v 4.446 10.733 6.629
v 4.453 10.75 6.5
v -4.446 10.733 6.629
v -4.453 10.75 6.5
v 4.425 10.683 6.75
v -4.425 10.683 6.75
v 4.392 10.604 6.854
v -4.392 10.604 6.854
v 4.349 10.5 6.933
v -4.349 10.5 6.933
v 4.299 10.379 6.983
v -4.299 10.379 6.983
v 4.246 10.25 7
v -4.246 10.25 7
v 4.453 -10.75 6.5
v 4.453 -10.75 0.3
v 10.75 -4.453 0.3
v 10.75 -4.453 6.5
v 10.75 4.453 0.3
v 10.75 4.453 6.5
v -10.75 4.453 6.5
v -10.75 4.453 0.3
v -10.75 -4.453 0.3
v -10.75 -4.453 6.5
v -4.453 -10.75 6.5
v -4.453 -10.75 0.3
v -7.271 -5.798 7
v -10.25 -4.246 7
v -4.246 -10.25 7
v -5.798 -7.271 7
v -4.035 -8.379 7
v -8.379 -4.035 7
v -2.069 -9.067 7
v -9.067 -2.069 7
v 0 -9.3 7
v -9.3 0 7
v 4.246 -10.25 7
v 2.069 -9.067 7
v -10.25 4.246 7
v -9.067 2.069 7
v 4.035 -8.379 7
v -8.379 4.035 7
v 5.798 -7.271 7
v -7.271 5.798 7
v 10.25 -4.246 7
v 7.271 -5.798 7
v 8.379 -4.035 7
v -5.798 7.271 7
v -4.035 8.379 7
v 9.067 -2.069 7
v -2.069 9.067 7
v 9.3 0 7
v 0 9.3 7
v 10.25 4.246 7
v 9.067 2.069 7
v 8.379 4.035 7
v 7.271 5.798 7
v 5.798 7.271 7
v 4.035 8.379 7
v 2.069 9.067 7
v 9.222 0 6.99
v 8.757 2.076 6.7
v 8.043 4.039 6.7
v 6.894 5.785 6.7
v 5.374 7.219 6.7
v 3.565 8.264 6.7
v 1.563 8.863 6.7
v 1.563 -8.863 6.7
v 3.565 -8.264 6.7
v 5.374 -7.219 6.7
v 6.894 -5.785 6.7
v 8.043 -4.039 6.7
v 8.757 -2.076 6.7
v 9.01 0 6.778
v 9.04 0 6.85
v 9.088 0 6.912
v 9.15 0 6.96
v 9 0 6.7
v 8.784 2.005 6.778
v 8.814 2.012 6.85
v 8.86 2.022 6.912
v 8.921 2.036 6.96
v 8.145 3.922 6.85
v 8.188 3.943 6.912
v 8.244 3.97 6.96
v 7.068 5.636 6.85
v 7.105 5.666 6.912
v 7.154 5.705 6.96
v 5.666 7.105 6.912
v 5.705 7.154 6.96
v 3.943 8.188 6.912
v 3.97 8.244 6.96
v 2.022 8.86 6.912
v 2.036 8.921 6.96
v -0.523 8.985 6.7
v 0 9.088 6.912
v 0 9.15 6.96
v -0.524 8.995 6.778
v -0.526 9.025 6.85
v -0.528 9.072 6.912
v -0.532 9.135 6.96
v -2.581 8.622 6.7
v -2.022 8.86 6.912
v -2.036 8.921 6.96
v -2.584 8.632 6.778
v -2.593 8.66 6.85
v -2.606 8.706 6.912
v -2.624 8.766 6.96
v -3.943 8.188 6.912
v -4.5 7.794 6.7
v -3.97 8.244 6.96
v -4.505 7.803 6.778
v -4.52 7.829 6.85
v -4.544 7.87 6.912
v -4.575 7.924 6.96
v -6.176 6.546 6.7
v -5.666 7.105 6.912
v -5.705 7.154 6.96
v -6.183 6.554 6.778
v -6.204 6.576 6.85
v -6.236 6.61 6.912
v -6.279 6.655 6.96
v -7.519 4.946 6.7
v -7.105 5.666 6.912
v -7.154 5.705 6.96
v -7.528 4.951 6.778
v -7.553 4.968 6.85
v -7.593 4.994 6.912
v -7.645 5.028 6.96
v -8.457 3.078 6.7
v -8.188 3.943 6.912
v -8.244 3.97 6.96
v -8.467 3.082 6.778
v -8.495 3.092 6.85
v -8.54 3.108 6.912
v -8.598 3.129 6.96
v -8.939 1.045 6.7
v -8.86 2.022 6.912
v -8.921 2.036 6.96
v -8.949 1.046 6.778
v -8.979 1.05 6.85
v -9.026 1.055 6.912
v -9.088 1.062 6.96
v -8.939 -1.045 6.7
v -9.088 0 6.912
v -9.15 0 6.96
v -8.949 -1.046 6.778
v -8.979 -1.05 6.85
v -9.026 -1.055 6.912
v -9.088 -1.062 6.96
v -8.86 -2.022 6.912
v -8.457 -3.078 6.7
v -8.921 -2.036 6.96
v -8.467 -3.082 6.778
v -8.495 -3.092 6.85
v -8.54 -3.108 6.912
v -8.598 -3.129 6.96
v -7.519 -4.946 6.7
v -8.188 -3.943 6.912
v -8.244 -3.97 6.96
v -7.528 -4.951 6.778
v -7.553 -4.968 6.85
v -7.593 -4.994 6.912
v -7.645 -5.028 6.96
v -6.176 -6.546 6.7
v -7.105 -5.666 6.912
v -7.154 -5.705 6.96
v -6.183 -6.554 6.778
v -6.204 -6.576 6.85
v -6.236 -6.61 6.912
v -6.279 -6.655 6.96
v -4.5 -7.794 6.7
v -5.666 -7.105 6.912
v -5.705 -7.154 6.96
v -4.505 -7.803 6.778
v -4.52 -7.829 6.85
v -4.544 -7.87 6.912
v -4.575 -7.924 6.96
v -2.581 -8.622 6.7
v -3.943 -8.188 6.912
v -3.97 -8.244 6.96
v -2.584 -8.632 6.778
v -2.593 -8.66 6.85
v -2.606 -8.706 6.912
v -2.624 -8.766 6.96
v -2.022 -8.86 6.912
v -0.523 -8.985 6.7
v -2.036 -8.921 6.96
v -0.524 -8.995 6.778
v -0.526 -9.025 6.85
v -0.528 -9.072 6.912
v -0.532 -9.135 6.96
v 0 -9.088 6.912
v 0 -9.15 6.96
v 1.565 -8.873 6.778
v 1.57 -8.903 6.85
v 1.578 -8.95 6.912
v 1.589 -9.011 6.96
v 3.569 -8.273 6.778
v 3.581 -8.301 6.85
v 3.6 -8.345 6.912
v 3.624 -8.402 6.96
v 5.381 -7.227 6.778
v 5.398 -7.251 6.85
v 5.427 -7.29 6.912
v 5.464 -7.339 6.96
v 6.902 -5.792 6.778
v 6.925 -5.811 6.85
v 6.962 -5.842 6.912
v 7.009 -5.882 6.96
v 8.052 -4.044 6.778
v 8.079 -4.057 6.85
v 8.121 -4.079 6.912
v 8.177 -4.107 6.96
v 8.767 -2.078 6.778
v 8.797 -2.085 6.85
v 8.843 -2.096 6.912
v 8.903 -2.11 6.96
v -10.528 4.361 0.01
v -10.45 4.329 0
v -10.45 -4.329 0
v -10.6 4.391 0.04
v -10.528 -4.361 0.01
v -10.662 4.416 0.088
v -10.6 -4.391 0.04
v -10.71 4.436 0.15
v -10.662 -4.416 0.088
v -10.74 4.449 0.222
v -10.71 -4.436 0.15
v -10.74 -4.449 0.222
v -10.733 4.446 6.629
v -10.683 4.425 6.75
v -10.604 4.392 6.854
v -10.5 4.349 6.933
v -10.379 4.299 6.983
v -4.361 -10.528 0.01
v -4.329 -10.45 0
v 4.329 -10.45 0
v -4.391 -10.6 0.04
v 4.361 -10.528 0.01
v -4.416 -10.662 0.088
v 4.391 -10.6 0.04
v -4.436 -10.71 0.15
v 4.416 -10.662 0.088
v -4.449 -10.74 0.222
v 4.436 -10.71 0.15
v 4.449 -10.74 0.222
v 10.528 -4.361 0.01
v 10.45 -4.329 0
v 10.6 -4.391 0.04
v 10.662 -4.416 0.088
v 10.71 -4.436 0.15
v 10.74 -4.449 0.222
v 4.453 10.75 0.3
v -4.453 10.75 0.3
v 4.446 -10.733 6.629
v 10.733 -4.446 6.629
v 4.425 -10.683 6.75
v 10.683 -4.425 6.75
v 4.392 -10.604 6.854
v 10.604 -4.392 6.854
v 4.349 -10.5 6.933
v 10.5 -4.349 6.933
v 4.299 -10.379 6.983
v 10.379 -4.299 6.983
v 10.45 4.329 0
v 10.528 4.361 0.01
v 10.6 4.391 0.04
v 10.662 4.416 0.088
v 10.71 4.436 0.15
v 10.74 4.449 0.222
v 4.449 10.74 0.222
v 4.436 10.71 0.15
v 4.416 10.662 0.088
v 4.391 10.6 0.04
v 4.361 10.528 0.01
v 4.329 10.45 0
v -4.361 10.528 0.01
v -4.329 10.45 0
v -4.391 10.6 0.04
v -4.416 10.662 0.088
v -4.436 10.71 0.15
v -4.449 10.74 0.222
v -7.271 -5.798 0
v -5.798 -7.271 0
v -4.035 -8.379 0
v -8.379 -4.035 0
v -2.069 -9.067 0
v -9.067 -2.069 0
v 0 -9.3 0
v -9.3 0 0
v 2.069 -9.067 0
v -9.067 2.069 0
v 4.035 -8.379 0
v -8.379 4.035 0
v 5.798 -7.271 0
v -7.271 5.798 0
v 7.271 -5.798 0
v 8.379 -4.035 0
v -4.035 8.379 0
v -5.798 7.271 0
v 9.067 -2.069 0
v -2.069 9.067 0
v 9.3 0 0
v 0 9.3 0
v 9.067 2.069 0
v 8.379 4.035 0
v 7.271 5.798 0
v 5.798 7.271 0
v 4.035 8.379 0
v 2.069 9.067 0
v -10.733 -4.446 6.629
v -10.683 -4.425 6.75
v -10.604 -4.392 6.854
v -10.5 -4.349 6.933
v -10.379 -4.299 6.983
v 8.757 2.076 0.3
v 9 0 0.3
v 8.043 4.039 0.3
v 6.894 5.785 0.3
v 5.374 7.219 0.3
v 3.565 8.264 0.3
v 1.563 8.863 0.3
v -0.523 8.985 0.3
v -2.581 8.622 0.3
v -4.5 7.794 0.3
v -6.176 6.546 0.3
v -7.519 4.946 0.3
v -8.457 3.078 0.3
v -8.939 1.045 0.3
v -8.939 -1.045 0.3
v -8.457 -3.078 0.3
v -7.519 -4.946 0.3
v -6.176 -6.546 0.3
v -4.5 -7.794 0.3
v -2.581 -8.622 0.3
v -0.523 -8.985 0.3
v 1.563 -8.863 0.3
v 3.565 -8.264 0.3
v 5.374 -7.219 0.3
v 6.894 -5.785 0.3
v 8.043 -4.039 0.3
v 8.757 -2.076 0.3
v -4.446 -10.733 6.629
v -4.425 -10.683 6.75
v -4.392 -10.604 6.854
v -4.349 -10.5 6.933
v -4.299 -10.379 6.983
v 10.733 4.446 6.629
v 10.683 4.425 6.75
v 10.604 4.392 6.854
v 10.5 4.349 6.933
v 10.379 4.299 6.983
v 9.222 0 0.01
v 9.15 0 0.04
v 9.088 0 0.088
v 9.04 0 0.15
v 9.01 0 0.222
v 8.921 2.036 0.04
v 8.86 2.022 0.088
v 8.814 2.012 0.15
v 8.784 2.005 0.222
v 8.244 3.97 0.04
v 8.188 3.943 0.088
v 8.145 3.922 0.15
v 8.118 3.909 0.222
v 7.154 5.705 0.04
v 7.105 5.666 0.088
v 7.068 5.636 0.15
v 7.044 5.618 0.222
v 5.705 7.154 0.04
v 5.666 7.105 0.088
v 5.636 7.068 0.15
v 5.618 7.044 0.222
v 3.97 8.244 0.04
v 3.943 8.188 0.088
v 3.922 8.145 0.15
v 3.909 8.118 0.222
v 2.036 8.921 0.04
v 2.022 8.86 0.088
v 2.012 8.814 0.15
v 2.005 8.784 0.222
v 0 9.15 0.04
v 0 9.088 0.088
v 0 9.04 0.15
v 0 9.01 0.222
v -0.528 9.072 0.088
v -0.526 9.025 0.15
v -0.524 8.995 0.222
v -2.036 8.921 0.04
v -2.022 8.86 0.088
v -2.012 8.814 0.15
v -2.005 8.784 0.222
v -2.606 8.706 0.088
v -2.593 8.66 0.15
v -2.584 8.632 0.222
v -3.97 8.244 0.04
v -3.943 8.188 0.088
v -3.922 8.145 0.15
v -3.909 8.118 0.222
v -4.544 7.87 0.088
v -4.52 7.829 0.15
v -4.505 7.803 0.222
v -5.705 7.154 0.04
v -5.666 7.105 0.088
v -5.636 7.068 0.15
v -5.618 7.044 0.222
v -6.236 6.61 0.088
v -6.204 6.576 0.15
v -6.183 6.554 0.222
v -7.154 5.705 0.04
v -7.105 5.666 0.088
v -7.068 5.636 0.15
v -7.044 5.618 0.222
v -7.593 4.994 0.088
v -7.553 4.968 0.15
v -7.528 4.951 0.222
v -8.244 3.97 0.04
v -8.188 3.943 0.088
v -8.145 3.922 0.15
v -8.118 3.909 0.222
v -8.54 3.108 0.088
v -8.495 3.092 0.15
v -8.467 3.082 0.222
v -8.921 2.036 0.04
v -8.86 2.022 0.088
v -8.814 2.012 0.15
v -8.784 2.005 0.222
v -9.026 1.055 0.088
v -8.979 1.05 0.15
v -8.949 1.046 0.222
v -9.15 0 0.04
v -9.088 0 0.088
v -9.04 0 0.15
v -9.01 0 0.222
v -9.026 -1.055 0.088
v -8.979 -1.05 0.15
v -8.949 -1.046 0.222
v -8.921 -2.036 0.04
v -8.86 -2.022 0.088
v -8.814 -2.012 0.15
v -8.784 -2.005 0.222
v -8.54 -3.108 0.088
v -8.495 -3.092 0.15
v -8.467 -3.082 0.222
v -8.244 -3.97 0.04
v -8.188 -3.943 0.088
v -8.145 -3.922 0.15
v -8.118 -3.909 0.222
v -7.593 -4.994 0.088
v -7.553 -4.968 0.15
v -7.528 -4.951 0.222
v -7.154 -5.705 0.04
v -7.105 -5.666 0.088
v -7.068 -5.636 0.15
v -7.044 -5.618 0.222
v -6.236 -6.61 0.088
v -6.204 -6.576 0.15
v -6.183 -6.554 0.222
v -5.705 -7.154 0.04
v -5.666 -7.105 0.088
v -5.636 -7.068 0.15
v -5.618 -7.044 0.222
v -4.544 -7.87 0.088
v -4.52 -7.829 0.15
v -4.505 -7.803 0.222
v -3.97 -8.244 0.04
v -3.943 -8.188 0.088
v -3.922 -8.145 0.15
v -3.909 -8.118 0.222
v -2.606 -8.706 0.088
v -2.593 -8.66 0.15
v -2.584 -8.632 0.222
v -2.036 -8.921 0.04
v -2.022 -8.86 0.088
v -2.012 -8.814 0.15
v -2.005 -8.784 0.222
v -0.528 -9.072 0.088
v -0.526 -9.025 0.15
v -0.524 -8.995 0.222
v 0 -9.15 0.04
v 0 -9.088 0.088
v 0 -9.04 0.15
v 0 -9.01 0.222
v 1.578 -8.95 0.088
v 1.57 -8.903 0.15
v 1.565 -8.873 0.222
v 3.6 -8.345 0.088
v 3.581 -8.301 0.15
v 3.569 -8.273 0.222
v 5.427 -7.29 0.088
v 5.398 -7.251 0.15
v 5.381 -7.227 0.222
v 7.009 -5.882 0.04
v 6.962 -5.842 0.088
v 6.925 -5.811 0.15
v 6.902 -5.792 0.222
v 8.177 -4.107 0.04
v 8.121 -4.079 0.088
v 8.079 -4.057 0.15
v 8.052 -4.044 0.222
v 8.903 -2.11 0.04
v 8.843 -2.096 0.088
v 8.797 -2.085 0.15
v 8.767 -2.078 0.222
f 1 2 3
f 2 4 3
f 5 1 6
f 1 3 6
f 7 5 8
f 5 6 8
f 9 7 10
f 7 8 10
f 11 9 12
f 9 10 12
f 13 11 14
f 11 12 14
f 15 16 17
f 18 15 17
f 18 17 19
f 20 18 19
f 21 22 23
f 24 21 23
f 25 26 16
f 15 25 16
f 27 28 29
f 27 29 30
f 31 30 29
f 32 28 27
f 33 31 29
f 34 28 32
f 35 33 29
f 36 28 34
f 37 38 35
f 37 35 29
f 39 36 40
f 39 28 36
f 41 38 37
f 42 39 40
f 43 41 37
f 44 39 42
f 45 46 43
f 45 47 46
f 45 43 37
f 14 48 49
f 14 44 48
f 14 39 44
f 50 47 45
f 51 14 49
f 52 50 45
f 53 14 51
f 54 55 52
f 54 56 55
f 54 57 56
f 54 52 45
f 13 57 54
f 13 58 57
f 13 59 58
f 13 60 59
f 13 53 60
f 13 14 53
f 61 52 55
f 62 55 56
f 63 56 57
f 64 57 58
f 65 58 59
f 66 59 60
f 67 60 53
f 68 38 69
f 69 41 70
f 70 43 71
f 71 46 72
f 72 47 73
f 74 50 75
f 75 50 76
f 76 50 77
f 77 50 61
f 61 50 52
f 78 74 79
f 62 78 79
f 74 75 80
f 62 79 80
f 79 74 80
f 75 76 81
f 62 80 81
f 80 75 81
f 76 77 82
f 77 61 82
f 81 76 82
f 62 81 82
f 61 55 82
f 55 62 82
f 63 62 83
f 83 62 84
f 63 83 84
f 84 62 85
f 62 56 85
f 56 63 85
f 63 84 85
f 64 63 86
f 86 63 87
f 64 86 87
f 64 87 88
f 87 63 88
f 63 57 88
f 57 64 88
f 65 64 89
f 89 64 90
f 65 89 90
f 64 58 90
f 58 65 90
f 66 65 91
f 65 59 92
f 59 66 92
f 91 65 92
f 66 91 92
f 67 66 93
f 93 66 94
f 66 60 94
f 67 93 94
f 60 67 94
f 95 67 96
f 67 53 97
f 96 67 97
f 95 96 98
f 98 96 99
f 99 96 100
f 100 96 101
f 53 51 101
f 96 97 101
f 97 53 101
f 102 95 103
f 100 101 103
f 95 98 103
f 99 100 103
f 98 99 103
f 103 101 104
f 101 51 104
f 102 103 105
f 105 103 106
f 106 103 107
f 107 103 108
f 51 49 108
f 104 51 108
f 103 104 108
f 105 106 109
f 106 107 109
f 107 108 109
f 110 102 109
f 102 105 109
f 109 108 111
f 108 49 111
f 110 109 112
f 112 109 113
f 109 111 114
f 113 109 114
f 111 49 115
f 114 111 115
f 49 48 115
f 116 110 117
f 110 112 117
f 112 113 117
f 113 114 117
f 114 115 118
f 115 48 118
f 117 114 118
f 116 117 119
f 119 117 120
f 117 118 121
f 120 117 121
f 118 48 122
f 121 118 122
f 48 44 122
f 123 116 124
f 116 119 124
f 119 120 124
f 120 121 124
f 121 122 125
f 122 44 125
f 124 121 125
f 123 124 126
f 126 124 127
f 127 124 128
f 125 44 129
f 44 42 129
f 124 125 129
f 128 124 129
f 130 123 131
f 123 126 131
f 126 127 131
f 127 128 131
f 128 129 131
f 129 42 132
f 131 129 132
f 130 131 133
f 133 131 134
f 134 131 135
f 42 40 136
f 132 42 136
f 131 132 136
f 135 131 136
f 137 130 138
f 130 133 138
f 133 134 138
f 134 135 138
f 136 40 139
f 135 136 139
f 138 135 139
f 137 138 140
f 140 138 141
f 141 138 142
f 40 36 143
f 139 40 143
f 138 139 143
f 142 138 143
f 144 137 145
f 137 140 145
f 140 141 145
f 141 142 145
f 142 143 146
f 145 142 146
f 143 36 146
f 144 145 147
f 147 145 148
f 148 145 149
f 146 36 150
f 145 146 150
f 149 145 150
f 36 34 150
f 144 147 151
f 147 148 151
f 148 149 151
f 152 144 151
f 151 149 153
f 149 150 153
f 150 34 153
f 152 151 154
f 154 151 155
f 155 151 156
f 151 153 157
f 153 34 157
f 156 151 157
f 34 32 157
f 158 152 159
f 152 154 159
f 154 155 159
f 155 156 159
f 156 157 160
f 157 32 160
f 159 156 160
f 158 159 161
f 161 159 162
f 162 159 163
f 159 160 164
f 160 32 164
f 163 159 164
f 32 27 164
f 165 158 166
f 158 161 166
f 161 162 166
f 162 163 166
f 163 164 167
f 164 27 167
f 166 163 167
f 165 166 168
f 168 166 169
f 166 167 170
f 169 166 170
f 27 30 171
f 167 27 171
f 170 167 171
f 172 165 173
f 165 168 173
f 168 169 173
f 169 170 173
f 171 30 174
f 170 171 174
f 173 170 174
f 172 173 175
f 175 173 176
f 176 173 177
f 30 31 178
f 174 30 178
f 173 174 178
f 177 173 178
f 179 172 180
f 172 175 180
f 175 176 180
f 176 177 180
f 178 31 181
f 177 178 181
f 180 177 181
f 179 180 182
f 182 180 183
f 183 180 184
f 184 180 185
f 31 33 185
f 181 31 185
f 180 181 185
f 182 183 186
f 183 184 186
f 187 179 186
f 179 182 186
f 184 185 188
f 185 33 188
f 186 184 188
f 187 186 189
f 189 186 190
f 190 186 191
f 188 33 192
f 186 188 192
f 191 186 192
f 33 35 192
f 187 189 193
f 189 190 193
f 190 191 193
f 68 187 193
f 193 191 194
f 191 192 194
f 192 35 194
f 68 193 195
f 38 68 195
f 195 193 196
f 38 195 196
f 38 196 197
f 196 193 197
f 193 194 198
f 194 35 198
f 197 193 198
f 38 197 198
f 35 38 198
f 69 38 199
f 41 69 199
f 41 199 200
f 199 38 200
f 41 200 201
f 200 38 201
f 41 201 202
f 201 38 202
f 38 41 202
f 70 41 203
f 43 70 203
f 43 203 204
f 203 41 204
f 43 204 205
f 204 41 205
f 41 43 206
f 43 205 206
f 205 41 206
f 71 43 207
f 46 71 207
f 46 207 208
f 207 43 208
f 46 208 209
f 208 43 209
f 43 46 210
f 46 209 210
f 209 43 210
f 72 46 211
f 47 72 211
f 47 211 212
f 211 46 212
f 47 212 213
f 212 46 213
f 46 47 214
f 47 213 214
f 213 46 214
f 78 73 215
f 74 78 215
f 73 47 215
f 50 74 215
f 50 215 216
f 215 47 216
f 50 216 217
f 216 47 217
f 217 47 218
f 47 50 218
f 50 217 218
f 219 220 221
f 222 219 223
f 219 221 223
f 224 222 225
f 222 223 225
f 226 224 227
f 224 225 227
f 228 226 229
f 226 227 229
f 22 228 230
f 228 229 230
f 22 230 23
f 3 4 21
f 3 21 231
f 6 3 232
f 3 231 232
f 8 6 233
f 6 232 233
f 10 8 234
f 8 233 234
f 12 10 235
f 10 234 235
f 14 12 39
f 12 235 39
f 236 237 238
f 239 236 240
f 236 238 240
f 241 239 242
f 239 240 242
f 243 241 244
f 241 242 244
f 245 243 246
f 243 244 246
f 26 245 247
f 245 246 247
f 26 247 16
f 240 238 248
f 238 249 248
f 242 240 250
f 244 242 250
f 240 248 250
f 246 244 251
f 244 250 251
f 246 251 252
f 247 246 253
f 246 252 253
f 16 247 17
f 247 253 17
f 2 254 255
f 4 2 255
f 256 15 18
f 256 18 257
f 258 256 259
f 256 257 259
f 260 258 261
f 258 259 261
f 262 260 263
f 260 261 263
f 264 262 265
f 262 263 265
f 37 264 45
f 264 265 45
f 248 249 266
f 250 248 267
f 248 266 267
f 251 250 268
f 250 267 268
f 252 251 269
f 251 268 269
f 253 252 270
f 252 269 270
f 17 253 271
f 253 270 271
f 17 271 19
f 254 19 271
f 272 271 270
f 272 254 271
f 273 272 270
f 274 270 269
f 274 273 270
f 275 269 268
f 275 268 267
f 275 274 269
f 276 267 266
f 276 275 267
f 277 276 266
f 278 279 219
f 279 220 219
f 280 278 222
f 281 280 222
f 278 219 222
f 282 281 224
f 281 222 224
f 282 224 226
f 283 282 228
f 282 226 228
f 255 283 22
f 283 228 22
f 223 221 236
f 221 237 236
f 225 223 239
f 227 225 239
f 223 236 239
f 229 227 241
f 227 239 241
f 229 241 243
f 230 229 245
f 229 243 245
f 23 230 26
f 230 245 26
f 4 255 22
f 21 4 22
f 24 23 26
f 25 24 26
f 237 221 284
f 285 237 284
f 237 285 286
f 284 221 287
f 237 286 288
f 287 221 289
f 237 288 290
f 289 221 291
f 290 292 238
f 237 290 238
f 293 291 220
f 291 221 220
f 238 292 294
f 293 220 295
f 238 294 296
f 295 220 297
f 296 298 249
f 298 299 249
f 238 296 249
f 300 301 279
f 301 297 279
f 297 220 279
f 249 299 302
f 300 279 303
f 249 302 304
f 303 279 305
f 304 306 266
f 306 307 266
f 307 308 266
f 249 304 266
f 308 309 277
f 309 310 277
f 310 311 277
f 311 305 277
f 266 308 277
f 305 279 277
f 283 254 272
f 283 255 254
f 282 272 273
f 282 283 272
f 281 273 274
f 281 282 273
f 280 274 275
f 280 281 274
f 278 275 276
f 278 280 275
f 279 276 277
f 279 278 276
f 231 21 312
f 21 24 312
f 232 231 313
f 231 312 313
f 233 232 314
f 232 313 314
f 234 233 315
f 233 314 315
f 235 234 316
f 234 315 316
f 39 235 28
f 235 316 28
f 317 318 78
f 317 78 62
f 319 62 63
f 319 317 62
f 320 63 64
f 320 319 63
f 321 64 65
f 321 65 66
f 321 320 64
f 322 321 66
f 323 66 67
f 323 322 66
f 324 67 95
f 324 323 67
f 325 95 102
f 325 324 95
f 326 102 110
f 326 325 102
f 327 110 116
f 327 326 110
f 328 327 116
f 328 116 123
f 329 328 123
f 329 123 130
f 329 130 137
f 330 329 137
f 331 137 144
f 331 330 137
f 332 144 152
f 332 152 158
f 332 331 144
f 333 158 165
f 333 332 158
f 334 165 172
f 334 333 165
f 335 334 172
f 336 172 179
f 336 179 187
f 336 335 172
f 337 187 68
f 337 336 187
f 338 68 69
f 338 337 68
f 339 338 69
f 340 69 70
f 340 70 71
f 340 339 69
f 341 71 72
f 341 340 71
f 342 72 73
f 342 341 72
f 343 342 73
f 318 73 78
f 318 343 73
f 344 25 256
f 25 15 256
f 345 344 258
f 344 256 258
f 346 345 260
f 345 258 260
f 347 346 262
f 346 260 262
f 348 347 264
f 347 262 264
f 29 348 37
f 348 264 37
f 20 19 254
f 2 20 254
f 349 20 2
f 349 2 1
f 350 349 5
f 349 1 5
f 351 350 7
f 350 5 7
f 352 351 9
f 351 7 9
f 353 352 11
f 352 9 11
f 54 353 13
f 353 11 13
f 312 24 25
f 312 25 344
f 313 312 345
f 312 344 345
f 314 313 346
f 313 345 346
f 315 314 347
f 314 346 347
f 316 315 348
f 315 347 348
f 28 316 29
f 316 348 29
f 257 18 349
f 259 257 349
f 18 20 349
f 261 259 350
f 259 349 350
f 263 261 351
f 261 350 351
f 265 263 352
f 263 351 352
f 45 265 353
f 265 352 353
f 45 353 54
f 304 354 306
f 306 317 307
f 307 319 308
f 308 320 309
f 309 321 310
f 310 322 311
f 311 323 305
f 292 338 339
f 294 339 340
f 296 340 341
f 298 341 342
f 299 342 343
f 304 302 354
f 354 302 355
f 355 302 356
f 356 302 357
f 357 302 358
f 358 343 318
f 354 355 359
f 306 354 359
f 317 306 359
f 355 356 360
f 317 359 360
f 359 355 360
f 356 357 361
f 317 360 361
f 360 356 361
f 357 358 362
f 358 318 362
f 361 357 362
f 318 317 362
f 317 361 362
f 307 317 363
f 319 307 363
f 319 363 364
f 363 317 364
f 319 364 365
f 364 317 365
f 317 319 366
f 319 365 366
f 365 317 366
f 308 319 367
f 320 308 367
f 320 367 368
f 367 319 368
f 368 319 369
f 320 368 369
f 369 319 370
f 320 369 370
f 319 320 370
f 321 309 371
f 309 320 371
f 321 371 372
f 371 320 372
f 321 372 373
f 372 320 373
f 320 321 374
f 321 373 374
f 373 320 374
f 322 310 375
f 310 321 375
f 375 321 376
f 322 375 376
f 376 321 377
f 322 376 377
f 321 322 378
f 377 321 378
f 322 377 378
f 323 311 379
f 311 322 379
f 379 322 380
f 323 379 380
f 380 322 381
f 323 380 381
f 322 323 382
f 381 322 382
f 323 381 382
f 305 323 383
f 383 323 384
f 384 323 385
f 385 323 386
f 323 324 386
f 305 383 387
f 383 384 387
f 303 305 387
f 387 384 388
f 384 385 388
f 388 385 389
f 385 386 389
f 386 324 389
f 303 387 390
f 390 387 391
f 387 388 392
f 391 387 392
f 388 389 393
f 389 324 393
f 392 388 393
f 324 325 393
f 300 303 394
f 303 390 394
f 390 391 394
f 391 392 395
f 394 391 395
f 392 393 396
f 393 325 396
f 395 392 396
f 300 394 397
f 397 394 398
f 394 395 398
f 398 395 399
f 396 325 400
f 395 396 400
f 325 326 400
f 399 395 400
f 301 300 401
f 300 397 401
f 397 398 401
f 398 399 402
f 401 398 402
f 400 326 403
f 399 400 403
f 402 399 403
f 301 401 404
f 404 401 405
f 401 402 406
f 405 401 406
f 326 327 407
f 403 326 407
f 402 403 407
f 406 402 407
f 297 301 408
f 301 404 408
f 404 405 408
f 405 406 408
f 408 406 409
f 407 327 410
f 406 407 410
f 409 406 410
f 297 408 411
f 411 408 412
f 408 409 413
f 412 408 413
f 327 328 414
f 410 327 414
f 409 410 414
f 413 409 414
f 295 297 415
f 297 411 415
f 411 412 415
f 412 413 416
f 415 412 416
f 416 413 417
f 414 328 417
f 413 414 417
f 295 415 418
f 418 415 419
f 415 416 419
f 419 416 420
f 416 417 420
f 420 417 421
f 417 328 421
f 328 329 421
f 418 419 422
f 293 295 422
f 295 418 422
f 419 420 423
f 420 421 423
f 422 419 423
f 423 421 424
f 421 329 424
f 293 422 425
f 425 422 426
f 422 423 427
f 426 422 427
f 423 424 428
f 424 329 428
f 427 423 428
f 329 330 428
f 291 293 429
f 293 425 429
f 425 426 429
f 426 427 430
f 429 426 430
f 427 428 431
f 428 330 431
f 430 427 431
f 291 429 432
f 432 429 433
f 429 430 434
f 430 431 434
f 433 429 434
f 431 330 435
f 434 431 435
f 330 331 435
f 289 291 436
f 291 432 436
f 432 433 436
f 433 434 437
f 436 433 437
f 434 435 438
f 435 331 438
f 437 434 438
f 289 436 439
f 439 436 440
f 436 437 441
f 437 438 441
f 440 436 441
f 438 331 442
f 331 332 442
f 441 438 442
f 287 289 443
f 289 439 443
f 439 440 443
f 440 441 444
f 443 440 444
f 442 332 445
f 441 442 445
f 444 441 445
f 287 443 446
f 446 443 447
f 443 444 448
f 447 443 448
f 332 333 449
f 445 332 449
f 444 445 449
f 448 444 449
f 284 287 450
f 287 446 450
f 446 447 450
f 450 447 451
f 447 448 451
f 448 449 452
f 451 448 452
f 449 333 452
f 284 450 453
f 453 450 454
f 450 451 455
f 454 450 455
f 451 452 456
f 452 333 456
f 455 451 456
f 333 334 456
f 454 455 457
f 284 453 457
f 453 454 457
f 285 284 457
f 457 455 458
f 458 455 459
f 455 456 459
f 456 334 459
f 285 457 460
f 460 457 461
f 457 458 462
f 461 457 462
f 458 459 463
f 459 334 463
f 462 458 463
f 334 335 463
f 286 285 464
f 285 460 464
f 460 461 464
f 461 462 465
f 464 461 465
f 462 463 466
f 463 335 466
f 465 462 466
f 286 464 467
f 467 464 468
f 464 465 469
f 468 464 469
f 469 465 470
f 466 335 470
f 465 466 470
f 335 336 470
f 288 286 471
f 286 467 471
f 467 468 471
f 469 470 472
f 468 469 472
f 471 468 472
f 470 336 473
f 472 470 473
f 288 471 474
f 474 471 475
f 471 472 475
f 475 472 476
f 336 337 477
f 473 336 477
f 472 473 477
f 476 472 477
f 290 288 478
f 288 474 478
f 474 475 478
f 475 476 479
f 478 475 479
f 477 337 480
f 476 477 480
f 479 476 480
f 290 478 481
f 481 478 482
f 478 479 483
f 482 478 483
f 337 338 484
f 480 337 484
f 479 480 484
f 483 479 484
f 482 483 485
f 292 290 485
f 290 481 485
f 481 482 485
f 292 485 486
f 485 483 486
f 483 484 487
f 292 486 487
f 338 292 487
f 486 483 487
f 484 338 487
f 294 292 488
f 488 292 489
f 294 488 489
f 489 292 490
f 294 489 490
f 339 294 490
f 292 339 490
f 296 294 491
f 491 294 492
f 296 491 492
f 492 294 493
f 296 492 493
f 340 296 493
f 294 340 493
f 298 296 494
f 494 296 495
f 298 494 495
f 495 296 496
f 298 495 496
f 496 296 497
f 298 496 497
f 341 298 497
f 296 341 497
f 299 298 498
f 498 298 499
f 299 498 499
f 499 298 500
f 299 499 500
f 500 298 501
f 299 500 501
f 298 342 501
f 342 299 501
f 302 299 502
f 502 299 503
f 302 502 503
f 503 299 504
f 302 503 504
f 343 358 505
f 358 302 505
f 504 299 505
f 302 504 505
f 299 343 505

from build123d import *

# Parameters (mm, degrees)
F1_R     = 9
F2_DEPTH = 7
F3_R     = 0.5
F4_R     = 0.3
F5_R     = 0.3
F6_R     = 0.3


with BuildPart() as f2:
    # F1 (on Top) → F2 (new body)
    with BuildSketch(Plane.XY):
        Polygon((4.4527957955, 10.75), (-4.4527957955, 10.75), (-10.75, 4.4527957955), (-10.75, -4.4527957955), (-4.4527957955, -10.75), (4.4527957955, -10.75), (10.75, -4.4527957955), (10.75, 4.4527957955), align=None)
        Circle(F1_R, mode=Mode.SUBTRACT)
    extrude(amount=F2_DEPTH)

    # F3
    f3_edges = [f2.edges().sort_by_distance(p)[0] for p in [
        (7.601398, 7.601398, 7),
        (0, 10.75, 7),
        (-7.601398, 7.601398, 7),
        (-10.75, 0, 7),
        (-7.601398, -7.601398, 7),
        (0, -10.75, 7),
        (7.601398, -7.601398, 7),
        (10.75, 0, 7),
    ]]
    fillet(f3_edges, radius=F3_R)

    # F4
    f4_edges = [f2.edges().sort_by_distance(p)[0] for p in [
        (0, -10.75, 0),
        (-7.601398, -7.601398, 0),
        (-10.75, 0, 0),
        (-7.601398, 7.601398, 0),
        (0, 10.75, 0),
        (7.601398, 7.601398, 0),
        (10.75, 0, 0),
        (7.601398, -7.601398, 0),
    ]]
    fillet(f4_edges, radius=F4_R)

    # F5
    f5_edges = [f2.edges().sort_by_distance(p)[0] for p in [
        (-9, 0, 0),
    ]]
    fillet(f5_edges, radius=F5_R)

    # F6
    f6_edges = [f2.edges().sort_by_distance(p)[0] for p in [
        (-9, 0, 7),
    ]]
    fillet(f6_edges, radius=F6_R)


solid = f2.part
